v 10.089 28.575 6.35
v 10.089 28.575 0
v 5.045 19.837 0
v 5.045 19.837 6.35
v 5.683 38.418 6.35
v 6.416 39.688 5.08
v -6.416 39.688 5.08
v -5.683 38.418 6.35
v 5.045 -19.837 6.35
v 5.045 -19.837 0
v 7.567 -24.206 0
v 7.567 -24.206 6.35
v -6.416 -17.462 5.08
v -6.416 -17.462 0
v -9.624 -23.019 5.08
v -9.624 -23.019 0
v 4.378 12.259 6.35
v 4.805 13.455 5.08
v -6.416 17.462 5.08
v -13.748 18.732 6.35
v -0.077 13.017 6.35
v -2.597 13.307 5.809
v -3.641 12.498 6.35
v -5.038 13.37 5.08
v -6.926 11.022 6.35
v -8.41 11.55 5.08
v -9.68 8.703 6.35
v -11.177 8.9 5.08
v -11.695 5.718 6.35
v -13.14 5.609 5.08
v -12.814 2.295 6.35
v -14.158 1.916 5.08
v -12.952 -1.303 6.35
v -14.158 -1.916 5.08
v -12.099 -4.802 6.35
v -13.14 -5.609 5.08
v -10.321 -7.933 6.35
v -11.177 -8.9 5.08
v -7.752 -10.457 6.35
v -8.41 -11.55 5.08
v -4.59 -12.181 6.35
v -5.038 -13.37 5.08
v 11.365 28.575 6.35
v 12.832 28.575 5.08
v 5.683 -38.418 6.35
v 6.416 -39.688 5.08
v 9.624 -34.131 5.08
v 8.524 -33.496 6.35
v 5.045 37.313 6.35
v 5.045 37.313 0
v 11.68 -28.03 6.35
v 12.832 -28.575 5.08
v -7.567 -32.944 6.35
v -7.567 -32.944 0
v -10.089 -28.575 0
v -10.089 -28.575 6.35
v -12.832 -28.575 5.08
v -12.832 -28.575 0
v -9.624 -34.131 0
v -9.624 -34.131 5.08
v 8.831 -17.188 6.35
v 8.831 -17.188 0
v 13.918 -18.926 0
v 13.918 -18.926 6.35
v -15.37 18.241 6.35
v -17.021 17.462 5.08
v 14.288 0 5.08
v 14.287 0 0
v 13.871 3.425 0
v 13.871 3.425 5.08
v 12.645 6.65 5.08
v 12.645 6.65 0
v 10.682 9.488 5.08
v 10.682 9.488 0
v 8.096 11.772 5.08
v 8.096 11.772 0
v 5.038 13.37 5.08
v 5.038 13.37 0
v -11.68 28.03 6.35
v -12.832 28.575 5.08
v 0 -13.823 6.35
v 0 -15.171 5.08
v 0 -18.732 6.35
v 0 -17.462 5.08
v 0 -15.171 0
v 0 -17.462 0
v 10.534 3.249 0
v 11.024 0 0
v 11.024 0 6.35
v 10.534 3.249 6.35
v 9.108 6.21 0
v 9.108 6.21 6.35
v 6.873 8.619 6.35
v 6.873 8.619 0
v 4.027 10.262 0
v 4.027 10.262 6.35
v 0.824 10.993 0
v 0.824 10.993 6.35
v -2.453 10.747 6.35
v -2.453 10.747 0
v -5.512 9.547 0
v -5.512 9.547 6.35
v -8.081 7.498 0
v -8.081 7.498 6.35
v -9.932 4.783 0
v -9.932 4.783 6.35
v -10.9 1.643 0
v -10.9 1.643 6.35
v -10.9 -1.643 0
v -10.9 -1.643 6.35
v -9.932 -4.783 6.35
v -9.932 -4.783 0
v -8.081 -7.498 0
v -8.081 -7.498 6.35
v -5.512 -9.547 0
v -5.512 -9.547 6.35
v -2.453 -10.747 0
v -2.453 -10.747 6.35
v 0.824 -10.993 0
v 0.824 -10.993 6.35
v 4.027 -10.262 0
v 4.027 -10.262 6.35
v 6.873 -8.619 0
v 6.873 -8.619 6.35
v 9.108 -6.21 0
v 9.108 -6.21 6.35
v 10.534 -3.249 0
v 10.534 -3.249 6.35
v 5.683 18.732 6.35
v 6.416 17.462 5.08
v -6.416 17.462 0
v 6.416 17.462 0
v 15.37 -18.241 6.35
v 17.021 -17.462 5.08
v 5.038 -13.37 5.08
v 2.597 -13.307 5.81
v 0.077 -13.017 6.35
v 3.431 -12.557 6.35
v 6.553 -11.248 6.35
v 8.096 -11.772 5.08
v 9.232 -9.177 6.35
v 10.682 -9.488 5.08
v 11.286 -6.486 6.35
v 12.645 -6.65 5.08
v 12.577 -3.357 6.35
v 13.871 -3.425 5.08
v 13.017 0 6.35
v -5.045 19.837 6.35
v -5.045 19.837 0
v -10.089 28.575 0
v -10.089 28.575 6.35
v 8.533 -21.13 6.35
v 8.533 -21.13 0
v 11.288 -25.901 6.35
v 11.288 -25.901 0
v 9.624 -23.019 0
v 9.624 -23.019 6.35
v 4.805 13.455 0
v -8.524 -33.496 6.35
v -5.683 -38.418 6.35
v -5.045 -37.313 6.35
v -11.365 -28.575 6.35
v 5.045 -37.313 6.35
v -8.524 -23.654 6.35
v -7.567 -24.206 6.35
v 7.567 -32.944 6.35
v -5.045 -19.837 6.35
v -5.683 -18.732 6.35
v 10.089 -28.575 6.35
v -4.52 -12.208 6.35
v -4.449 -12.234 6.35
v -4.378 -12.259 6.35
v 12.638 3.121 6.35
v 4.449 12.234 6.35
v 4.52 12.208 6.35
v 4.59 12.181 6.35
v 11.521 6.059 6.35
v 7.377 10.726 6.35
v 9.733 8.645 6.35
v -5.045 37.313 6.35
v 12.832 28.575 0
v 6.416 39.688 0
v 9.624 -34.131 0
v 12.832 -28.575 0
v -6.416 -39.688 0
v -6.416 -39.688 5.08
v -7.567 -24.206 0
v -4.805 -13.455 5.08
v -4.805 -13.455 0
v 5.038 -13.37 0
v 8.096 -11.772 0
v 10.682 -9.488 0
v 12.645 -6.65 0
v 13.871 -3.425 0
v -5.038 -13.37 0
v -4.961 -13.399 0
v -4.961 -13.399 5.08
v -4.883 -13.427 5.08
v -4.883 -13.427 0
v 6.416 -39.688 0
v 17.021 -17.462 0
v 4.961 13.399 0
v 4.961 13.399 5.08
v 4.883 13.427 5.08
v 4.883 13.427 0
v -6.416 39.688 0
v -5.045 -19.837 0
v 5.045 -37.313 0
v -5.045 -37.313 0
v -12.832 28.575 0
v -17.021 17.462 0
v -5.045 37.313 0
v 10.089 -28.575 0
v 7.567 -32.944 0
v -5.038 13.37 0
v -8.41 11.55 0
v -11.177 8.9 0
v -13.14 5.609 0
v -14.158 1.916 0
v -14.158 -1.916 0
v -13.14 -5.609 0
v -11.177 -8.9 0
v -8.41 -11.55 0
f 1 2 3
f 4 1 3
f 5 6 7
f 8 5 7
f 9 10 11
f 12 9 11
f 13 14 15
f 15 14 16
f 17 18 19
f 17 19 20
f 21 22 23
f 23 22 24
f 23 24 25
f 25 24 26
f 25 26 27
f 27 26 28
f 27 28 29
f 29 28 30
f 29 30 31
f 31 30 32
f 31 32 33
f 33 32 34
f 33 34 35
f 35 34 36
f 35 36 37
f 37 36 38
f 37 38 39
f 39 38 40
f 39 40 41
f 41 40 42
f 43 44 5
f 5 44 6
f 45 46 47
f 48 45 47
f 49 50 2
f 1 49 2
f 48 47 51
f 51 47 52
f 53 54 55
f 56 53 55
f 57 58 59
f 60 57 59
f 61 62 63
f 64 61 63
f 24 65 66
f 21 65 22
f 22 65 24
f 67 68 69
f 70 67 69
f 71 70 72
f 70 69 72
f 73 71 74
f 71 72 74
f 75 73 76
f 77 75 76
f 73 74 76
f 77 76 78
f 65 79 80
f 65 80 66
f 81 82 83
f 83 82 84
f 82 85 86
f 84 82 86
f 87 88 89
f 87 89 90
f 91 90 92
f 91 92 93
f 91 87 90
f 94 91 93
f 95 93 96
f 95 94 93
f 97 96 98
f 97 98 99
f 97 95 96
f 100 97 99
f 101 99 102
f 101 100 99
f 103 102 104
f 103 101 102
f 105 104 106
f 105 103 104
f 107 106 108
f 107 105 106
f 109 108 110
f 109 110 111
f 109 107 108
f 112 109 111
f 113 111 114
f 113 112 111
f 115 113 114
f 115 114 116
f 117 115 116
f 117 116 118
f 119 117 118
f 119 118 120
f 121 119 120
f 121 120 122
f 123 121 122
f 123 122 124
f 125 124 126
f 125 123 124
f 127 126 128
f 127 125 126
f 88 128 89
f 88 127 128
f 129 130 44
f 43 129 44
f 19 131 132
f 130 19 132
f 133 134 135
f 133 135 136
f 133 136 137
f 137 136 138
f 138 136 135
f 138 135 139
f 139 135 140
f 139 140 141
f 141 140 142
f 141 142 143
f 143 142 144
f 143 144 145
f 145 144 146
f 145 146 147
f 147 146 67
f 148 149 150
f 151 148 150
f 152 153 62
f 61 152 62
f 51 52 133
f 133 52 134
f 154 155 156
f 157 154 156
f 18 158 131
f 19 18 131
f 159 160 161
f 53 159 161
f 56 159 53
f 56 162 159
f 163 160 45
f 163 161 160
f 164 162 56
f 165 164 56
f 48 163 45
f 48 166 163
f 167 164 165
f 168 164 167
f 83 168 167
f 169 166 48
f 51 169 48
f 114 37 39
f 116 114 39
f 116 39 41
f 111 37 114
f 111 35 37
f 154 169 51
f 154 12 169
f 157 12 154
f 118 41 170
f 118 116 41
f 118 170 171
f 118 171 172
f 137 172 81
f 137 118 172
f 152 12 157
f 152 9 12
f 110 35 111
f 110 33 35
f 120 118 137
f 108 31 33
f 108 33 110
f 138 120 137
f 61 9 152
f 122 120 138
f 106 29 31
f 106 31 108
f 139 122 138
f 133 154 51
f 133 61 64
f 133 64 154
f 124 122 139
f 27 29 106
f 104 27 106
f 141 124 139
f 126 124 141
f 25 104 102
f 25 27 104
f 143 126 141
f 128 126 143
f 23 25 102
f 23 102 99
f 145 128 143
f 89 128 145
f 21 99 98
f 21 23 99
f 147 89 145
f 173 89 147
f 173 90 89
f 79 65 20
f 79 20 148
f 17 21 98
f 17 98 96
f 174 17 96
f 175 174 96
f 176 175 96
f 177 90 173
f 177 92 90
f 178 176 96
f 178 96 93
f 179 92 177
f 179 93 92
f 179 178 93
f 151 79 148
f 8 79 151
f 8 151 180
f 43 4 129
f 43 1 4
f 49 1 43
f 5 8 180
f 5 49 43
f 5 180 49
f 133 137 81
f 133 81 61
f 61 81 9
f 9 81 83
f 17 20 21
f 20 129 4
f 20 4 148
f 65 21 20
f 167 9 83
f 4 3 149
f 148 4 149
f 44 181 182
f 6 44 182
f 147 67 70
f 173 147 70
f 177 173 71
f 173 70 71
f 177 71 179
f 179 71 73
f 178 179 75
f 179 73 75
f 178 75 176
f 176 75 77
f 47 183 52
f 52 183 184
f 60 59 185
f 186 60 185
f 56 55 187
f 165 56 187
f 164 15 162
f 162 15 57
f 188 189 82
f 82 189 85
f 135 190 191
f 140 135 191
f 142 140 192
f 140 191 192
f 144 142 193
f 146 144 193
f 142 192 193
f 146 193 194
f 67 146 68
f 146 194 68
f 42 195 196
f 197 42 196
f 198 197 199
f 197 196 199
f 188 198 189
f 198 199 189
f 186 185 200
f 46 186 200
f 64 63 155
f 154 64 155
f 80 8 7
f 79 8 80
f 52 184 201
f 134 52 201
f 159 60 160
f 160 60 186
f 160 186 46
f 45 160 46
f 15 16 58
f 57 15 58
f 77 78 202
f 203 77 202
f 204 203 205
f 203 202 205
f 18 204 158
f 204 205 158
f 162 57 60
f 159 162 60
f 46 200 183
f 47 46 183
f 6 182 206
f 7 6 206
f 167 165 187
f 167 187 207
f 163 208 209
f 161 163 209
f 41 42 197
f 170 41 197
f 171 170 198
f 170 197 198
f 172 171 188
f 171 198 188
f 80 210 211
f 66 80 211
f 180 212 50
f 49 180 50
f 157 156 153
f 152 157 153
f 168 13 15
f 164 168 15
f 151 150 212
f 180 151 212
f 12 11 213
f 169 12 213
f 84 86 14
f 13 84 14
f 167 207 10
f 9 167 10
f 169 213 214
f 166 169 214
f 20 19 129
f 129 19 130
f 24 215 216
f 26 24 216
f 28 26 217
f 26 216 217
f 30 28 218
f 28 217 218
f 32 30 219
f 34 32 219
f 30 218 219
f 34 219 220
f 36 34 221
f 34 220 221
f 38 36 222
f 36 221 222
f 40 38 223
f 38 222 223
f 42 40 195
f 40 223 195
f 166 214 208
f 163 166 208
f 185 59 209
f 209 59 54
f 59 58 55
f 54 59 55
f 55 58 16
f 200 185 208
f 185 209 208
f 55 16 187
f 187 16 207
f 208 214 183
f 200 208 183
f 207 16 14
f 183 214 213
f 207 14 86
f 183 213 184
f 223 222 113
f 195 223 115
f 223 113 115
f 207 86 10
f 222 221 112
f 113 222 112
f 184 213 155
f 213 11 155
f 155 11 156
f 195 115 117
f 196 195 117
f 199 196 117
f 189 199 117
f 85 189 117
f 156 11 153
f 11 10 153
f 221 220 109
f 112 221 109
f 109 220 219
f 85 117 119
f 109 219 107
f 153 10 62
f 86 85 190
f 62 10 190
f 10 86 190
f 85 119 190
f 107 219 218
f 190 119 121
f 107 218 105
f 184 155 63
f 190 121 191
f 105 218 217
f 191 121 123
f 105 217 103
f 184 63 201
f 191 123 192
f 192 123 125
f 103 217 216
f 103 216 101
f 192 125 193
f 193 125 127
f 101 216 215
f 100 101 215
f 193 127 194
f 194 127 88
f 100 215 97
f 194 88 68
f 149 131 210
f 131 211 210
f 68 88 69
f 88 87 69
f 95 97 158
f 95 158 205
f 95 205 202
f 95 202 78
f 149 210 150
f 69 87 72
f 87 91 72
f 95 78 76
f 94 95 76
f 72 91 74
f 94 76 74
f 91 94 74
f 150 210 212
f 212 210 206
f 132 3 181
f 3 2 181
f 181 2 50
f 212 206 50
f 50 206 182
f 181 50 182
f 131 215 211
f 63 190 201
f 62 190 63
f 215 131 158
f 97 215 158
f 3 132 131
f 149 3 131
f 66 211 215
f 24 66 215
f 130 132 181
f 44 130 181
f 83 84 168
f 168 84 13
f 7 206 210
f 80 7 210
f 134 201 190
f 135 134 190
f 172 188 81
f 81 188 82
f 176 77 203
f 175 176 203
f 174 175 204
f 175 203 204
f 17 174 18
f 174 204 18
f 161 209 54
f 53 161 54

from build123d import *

# Parameters (mm, degrees)
F2_DEPTH = 6.35
F1_R     = 11.0236
F3_DEPTH = 6.35
F4_SIZE  = 1.27


with BuildPart() as f2:
    # F0 (on Top) → F2 (new body)
    with BuildSketch(Plane.XY):
        Polygon((-6.4158048664, 17.4625), (6.4158048664, 17.4625), (12.8316097327, 28.575), (6.4158048664, 39.6875), (-6.4158048664, 39.6875), (-12.8316097327, 28.575), align=None)
        Polygon((10.0893114241, 28.575), (5.0446557121, 19.8374), (-5.0446557121, 19.8374), (-10.0893114241, 28.575), (-5.0446557121, 37.3126), (5.0446557121, 37.3126), align=None, mode=Mode.SUBTRACT)
    extrude(amount=F2_DEPTH)

    # F1 (on face) → F3 (join)
    with BuildSketch(Plane.XY):
        with BuildLine():
            Line((-6.4158048664, 17.4625), (-9.6237072152, 23.0187498538))
            Line((-9.6237072152, 23.0187498538), (-12.8316097327, 28.575))
            Line((-12.8316097327, 28.575), (-17.0211530549, 17.4625))
            Line((-17.0211530549, 17.4625), (-5.038242593, 13.3696958763))
            ThreePointArc((-5.038242593, 13.3696958763), (-0.124129265, 14.2869607746), (4.8051799463, 13.4552183904))
            Line((4.8051799463, 13.4552183904), (-6.4158048664, 17.4625))
        make_face()
        with BuildLine():
            ThreePointArc((5.038242593, 13.3696958763), (4.9218970272, 13.4129633528), (4.8051799463, 13.4552183904))
            ThreePointArc((4.8051799463, 13.4552183904), (-0.124129265, 14.2869607746), (-5.038242593, 13.3696958763))
            Line((-5.038242593, 13.3696958763), (5.038242593, 13.3696958763))
        make_face()
        with BuildLine():
            Line((5.038242593, 13.3696958763), (-5.038242593, 13.3696958763))
            ThreePointArc((-5.038242593, 13.3696958763), (-14.2875, 0), (-5.038242593, -13.3696958763))
            Line((-5.038242593, -13.3696958763), (5.038242593, -13.3696958763))
            ThreePointArc((5.038242593, -13.3696958763), (11.7498201539, -8.1286150482), (14.2875, 0))
            ThreePointArc((14.2875, 0), (11.7498201539, 8.1286150482), (5.038242593, 13.3696958763))
        make_face()
        Circle(F1_R, mode=Mode.SUBTRACT)
        with BuildLine():
            Line((5.038242593, -13.3696958763), (-5.038242593, -13.3696958763))
            ThreePointArc((-5.038242593, -13.3696958763), (-4.9218969503, -13.412963381), (-4.805179792, -13.4552184455))
            ThreePointArc((-4.805179792, -13.4552184455), (0.1241293469, -14.2869607739), (5.038242593, -13.3696958763))
        make_face()
        with BuildLine():
            ThreePointArc((5.038242593, -13.3696958763), (0.1241293469, -14.2869607739), (-4.805179792, -13.4552184455))
            Line((-4.805179792, -13.4552184455), (0, -15.1712628866))
            Line((0, -15.1712628866), (6.4158048664, -17.4625))
            Line((6.4158048664, -17.4625), (8.5332421601, -21.1300089747))
            Line((8.5332421601, -21.1300089747), (8.8309233846, -17.1881254571))
            Line((8.8309233846, -17.1881254571), (13.9178989278, -18.9255993827))
            Line((13.9178989278, -18.9255993827), (11.2879660769, -25.9013307593))
            Line((11.2879660769, -25.9013307593), (12.8316097327, -28.575))
            Line((12.8316097327, -28.575), (17.0211530549, -17.4625))
            Line((17.0211530549, -17.4625), (5.038242593, -13.3696958763))
        make_face()
        with BuildLine():
            Line((6.4158048664, -39.6875), (9.6237072578, -34.1312500723))
            ThreePointArc((9.6237072578, -34.1312500723), (5.5562499639, -38.1987073204), (0, -39.6875))
            Line((0, -39.6875), (6.4158048664, -39.6875))
        make_face()
        with BuildLine():
            ThreePointArc((9.6237071905, -23.0187498111), (5.5562499055, -18.9512926459), (0, -17.4625))
            ThreePointArc((0, -17.4625), (-5.556249932, -18.9512926612), (-9.623707221, -23.018749864))
            ThreePointArc((-9.623707221, -23.018749864), (-11.1125, -28.5750000026), (-9.6237072184, -34.1312501405))
            ThreePointArc((-9.6237072184, -34.1312501405), (-5.5562499298, -38.1987073401), (0, -39.6875))
            ThreePointArc((0, -39.6875), (5.5562499639, -38.1987073204), (9.6237072578, -34.1312500723))
            ThreePointArc((9.6237072578, -34.1312500723), (10.7338507338, -31.451126679), (11.1125, -28.575))
            ThreePointArc((11.1125, -28.575), (10.7338507164, -25.6988732559), (9.6237071905, -23.0187498111))
        make_face()
        Polygon((0, -19.8374), (5.0446557121, -19.8374), (7.5669837696, -24.2062003489), (10.0893114241, -28.575), (7.5669837791, -32.9437996345), (5.0446557121, -37.3126), (0, -37.3126), (-5.0446557121, -37.3126), (-7.5669835677, -32.9438000008), (-10.0893114241, -28.575), (-7.5669835463, -24.2061999623), (-5.0446557121, -19.8374), align=None, mode=Mode.SUBTRACT)
        with BuildLine():
            Line((9.6237072578, -34.1312500723), (12.8316097327, -28.575))
            Line((12.8316097327, -28.575), (11.2879660769, -25.9013307593))
            Line((11.2879660769, -25.9013307593), (9.6237071905, -23.0187498111))
            ThreePointArc((9.6237071905, -23.0187498111), (10.7338507164, -25.6988732559), (11.1125, -28.575))
            ThreePointArc((11.1125, -28.575), (10.7338507338, -31.451126679), (9.6237072578, -34.1312500723))
        make_face()
        with BuildLine():
            ThreePointArc((0, -39.6875), (-5.5562499298, -38.1987073401), (-9.6237072184, -34.1312501405))
            Line((-9.6237072184, -34.1312501405), (-6.4158048664, -39.6875))
            Line((-6.4158048664, -39.6875), (0, -39.6875))
        make_face()
        with BuildLine():
            ThreePointArc((-9.6237072184, -34.1312501405), (-11.1125, -28.5750000026), (-9.623707221, -23.018749864))
            Line((-9.623707221, -23.018749864), (-12.8316097327, -28.575))
            Line((-12.8316097327, -28.575), (-9.6237072184, -34.1312501405))
        make_face()
        with BuildLine():
            ThreePointArc((-9.623707221, -23.018749864), (-5.556249932, -18.9512926612), (0, -17.4625))
            Line((0, -17.4625), (-6.4158048664, -17.4625))
            Line((-6.4158048664, -17.4625), (-9.623707221, -23.018749864))
        make_face()
        with BuildLine():
            Line((8.5332421601, -21.1300089747), (6.4158048664, -17.4625))
            Line((6.4158048664, -17.4625), (0, -17.4625))
            ThreePointArc((0, -17.4625), (5.5562499055, -18.9512926459), (9.6237071905, -23.0187498111))
            Line((9.6237071905, -23.0187498111), (8.5332421601, -21.1300089747))
        make_face()
        Polygon((6.4158048664, -17.4625), (0, -15.1712628866), (0, -17.4625), align=None)
    extrude(amount=F3_DEPTH)

    # F4
    f4_edges = [f2.edges().sort_by_distance(p)[0] for p in [
        (-11.029698, 15.416098, 6.35),
        (-14.926381, 23.01875, 6.35),
        (-9.623707, 34.13125, 6.35),
        (0, 39.6875, 6.35),
        (9.623707, 34.13125, 6.35),
        (9.623707, 23.01875, 6.35),
        (0, 17.4625, 6.35),
        (-0.805312, 15.458859, 6.35),
        (14.286961, 0.124129, 6.35),
        (-14.286961, -0.124129, 6.35),
        (9.623707, -34.13125, 6.35),
        (0, -39.6875, 6.35),
        (-9.623707, -34.13125, 6.35),
        (-9.623707, -23.01875, 6.35),
        (-3.207902, -17.4625, 6.35),
        (14.926381, -23.01875, 6.35),
        (11.029698, -15.416098, 6.35),
        (-2.40259, -14.313241, 6.35),
    ]]
    chamfer(f4_edges, length=F4_SIZE)


solid = f2.part
